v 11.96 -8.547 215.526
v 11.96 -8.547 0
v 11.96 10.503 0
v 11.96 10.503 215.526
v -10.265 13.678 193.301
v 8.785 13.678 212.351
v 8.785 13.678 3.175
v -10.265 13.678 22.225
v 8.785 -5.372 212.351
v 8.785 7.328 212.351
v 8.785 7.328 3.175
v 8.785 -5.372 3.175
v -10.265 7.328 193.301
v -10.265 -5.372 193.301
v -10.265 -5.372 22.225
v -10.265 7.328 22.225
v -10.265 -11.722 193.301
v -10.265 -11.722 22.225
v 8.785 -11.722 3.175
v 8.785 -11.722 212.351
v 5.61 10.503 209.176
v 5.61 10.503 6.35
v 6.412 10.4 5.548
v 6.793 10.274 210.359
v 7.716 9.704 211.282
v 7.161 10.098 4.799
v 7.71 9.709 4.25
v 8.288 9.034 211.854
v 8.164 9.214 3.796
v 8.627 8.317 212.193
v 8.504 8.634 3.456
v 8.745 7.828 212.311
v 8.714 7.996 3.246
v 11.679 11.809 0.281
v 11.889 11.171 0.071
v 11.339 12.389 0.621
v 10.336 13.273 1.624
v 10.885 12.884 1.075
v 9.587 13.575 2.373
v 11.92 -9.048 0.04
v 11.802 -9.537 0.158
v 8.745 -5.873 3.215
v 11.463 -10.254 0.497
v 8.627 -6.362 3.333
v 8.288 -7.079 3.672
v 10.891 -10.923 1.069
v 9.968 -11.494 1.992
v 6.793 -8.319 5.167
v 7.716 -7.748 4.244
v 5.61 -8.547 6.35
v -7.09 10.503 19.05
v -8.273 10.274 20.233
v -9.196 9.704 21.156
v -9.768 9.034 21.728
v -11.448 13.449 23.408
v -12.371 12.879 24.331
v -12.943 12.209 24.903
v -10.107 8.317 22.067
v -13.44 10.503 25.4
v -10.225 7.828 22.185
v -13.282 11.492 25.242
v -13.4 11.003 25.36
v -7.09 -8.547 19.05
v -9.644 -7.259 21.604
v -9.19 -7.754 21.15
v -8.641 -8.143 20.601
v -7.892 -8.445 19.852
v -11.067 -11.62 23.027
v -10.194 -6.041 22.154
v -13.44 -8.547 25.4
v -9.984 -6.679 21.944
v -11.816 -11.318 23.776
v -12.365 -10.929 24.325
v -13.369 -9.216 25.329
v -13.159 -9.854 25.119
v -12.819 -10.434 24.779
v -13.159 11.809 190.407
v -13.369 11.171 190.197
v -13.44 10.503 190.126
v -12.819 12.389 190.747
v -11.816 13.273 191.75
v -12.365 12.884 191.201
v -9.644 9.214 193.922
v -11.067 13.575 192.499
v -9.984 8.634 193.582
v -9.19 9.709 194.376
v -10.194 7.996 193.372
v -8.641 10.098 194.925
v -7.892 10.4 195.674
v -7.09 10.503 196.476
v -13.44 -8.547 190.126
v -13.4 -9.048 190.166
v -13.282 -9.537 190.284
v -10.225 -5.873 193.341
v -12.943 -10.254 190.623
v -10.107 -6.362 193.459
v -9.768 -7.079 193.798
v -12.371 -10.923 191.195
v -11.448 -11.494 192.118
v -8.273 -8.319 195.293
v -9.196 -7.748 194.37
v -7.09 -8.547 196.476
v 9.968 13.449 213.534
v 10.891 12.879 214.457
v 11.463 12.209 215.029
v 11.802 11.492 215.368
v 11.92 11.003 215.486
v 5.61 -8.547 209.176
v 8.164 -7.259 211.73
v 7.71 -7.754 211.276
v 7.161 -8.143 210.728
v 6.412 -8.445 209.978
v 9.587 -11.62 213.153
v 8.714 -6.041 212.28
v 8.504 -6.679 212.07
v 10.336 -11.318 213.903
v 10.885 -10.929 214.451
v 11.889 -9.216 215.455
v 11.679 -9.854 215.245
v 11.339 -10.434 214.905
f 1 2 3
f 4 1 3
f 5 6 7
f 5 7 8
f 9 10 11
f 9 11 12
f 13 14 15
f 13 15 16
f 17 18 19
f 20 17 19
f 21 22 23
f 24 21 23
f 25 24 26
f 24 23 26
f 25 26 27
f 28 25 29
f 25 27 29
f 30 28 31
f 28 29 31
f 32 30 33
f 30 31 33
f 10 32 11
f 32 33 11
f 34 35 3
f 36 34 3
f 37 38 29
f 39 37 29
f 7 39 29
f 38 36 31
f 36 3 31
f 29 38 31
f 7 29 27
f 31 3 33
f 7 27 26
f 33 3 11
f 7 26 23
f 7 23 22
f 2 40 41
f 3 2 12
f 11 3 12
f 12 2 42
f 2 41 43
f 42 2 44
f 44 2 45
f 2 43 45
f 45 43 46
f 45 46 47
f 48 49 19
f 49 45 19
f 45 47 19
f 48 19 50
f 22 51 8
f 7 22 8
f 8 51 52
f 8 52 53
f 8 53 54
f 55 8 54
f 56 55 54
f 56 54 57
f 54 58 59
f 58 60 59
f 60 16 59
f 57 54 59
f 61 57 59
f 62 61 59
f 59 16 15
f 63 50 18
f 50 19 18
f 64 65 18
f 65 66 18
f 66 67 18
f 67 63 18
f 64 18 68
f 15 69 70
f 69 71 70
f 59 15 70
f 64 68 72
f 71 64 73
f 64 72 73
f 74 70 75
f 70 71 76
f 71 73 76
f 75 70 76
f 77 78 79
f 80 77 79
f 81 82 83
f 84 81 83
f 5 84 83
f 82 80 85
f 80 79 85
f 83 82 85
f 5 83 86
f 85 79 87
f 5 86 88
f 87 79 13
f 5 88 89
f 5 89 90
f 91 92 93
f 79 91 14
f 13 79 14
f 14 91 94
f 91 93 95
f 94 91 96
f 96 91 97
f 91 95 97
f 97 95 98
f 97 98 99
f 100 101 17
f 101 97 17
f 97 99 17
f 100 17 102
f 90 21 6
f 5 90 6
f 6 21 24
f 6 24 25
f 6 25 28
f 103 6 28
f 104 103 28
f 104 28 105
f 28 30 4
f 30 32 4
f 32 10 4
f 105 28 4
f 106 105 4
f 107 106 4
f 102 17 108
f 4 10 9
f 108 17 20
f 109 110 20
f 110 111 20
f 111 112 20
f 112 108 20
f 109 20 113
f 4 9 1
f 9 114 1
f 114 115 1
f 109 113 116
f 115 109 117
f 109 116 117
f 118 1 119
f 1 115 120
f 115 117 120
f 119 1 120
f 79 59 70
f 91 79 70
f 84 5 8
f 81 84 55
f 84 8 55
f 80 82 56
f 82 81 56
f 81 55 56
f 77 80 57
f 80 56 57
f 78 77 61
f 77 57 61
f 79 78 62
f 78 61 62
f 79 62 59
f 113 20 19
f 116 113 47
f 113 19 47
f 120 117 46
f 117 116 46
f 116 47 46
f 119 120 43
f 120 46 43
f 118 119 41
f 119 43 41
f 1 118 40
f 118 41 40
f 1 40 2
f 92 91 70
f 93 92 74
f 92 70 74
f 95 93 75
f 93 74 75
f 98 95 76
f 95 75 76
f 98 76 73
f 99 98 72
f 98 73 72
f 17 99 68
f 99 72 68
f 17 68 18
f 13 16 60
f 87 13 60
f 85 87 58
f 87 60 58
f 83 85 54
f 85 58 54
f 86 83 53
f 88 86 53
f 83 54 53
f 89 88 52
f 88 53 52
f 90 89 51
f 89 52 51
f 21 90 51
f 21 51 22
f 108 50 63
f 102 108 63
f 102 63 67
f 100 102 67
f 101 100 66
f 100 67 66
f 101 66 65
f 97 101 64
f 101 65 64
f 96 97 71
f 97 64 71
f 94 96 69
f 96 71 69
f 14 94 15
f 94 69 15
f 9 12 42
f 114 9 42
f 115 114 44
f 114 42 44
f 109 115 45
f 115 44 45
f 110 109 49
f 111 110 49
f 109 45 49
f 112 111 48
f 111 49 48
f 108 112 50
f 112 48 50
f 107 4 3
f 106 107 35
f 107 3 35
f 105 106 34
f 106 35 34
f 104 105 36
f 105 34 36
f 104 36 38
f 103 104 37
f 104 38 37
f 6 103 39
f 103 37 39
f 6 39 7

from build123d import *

# Parameters (mm, degrees)
F1_DEPTH = 215.5261469047
F4_DEPTH = 25.4
F5_DEPTH = 25.4


with BuildPart() as f1:
    # F0 (on Top) → F1 (new body)
    with BuildSketch(Plane.XY):
        with BuildLine():
            Line((-10.2649833994, -11.722455886), (8.7850166006, -11.722455886))
            ThreePointArc((8.7850166006, -11.722455886), (11.0300806309, -10.7925199163), (11.9600166006, -8.547455886))
            Line((11.9600166006, -8.547455886), (11.9600166006, 10.502544114))
            ThreePointArc((11.9600166006, 10.502544114), (11.0300806309, 12.7476081443), (8.7850166006, 13.677544114))
            Line((8.7850166006, 13.677544114), (-10.2649833994, 13.677544114))
            ThreePointArc((-10.2649833994, 13.677544114), (-12.5100474297, 12.7476081443), (-13.4399833994, 10.502544114))
            Line((-13.4399833994, 10.502544114), (-13.4399833994, -8.547455886))
            ThreePointArc((-13.4399833994, -8.547455886), (-12.5100474297, -10.7925199163), (-10.2649833994, -11.722455886))
        make_face()
        with BuildLine():
            ThreePointArc((8.7850166006, -5.372455886), (7.8550806309, -7.6175199163), (5.6100166006, -8.547455886))
            Line((5.6100166006, -8.547455886), (-7.0899833994, -8.547455886))
            ThreePointArc((-7.0899833994, -8.547455886), (-9.3350474297, -7.6175199163), (-10.2649833994, -5.372455886))
            Line((-10.2649833994, -5.372455886), (-10.2649833994, 7.327544114))
            ThreePointArc((-10.2649833994, 7.327544114), (-9.3350474297, 9.5726081443), (-7.0899833994, 10.502544114))
            Line((-7.0899833994, 10.502544114), (5.6100166006, 10.502544114))
            ThreePointArc((5.6100166006, 10.502544114), (7.8550806309, 9.5726081443), (8.7850166006, 7.327544114))
            Line((8.7850166006, 7.327544114), (8.7850166006, -5.372455886))
        make_face(mode=Mode.SUBTRACT)
    extrude(amount=F1_DEPTH)

    # F2 (on Front) → F4 (cut, symmetric)
    with BuildSketch(Plane.XZ):
        Polygon((-13.4399833994, 0), (11.9600166006, 0), (-13.4399833994, 25.4), align=None)
    extrude(amount=F4_DEPTH, both=True, mode=Mode.SUBTRACT)

    # F3 (on Front) → F5 (cut, symmetric)
    with BuildSketch(Plane.XZ):
        Polygon((-13.4399833994, 215.5261469047), (-13.4399833994, 190.1261469047), (11.9600166006, 215.5261469047), align=None)
    extrude(amount=F5_DEPTH, both=True, mode=Mode.SUBTRACT)


solid = f1.part
